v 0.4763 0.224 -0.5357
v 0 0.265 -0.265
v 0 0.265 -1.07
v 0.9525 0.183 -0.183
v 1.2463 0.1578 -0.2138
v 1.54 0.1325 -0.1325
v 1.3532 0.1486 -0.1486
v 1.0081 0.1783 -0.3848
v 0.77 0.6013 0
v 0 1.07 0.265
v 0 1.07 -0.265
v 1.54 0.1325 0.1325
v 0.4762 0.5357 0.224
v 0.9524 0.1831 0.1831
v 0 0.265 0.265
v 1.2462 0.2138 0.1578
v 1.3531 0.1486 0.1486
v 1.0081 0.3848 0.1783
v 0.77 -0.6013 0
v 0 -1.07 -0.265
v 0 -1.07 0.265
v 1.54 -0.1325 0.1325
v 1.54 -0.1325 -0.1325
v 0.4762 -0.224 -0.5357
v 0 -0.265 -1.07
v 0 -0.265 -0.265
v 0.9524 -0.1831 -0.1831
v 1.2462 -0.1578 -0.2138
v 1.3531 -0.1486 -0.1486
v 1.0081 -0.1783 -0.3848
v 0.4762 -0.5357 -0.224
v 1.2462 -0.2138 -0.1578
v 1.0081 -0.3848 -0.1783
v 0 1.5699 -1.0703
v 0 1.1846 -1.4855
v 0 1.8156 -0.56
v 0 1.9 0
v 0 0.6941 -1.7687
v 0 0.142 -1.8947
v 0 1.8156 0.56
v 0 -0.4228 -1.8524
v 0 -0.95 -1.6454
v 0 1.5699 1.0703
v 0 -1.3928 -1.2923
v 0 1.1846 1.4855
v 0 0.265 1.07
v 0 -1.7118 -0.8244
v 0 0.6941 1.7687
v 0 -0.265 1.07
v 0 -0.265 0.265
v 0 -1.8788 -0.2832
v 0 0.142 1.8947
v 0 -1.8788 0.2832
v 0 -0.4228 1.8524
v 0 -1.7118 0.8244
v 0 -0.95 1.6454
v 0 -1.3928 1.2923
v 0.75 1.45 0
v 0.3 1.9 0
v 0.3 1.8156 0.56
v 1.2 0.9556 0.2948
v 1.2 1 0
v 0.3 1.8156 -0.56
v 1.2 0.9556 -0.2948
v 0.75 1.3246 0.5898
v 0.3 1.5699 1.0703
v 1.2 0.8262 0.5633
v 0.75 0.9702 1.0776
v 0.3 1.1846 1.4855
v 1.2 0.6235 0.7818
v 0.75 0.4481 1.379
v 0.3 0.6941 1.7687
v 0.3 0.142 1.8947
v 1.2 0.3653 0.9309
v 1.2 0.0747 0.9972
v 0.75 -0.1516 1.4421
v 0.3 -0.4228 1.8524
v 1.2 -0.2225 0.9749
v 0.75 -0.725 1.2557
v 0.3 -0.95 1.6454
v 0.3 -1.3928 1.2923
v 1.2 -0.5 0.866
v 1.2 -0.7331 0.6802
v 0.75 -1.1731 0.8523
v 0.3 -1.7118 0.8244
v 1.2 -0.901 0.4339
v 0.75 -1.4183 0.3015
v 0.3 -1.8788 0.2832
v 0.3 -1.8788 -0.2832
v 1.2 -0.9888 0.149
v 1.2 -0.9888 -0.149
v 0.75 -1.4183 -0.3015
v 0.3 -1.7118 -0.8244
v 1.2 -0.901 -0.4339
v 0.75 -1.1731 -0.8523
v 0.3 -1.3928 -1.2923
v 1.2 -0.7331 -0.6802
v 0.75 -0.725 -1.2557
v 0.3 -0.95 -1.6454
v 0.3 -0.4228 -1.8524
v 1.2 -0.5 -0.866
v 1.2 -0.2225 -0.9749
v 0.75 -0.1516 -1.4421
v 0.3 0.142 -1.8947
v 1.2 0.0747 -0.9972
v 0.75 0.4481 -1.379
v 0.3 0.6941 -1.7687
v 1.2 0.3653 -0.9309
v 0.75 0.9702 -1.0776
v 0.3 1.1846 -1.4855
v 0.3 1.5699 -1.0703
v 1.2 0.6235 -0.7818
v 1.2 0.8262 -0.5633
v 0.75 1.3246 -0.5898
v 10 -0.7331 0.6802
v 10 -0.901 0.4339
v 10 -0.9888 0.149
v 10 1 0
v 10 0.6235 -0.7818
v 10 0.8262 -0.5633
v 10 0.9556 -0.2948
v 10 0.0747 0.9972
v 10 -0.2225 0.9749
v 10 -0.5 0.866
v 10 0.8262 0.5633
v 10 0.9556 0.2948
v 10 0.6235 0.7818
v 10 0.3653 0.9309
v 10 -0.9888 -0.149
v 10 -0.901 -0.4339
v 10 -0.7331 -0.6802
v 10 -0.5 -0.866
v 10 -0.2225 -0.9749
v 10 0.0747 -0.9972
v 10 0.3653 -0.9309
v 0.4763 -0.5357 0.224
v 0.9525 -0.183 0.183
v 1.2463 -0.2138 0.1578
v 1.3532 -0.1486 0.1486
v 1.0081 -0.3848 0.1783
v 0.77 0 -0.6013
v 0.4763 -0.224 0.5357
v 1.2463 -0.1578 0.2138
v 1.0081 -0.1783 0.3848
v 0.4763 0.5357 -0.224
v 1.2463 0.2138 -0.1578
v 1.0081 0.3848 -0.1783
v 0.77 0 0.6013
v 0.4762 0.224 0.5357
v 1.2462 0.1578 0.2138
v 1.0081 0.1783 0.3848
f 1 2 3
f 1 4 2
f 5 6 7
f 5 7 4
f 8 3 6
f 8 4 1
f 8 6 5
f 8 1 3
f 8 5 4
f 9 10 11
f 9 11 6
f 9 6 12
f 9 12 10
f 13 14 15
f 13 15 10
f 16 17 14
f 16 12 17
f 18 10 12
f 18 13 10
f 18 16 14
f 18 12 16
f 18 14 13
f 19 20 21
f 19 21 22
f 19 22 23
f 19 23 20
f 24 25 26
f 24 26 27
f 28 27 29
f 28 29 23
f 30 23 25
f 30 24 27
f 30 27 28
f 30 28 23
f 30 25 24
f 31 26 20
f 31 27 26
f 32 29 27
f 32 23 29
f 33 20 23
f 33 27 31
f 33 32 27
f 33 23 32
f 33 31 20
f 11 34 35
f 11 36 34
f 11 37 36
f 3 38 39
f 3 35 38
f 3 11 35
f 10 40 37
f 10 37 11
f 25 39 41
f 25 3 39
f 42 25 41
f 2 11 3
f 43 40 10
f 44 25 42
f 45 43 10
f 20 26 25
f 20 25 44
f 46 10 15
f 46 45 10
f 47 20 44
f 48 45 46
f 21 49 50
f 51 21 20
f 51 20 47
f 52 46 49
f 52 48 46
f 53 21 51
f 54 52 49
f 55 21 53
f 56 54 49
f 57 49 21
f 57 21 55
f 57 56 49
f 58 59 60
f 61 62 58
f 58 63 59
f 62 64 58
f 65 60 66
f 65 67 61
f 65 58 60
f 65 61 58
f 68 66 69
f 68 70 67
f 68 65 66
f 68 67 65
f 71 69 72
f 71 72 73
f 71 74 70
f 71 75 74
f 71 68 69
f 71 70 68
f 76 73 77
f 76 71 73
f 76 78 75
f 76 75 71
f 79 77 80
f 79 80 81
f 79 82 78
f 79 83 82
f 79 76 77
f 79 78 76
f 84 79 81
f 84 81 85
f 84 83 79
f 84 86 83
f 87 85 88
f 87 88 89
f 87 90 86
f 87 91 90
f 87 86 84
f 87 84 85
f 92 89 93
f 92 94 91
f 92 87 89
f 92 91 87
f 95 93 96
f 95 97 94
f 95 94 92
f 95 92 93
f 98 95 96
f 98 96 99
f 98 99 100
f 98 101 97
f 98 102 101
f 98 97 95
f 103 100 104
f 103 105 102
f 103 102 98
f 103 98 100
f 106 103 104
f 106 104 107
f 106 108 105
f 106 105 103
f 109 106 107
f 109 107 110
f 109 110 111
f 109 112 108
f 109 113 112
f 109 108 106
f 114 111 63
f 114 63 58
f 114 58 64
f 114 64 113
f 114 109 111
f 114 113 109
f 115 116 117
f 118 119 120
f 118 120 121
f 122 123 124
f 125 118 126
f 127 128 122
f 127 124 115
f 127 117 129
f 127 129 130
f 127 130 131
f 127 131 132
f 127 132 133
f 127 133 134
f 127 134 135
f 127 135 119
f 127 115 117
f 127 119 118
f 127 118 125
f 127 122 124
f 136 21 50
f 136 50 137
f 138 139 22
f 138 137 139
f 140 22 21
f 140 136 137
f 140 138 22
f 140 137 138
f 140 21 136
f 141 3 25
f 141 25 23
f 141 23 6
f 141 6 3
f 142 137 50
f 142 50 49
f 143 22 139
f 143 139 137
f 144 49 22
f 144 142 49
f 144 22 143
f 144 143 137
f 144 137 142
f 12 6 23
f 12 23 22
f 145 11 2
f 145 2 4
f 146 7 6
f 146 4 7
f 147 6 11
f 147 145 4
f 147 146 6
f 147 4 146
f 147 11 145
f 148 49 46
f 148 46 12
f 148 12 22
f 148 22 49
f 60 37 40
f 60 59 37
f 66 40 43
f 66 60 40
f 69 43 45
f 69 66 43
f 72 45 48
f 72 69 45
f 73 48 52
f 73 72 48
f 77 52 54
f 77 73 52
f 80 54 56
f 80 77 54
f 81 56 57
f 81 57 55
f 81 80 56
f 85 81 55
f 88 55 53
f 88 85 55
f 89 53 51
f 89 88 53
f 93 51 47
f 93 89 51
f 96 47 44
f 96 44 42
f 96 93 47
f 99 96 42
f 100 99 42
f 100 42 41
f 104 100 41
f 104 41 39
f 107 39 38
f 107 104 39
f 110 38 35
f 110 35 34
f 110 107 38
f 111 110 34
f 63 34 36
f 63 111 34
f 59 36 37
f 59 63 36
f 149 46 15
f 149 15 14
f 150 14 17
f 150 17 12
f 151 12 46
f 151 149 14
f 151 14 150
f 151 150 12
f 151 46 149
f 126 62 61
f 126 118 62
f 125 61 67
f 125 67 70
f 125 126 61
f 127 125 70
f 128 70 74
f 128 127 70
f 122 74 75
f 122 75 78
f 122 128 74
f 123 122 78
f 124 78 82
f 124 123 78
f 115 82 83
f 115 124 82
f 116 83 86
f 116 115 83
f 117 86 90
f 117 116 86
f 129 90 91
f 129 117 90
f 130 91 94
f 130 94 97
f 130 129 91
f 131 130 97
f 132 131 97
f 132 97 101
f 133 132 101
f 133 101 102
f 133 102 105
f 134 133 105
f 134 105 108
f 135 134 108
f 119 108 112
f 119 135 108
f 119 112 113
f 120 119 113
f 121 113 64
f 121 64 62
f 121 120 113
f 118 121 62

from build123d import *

# Parameters (mm, degrees)
SKETCH3_W         = 0.53
SKETCH3_H         = 2.14
SKETCH4_W         = 0.265
SKETCH4_H         = 0.265
CIRPATTERN1_COUNT = 2
CIRPATTERN1_ANGLE = 90


with BuildPart() as part:
    # BodySke → Base-Revolve (revolve)
    with BuildSketch(Plane.XY):
        Polygon((0, 0), (0, 1.9), (0.3, 1.9), (1.2, 1), (10, 1), (10, 0), align=None)
    revolve(axis=Axis((-6.35, 0, 0), (1, 0, 0)))

    # Sketch3 → Cross section 0
    with BuildSketch(Plane.ZY):
        Rectangle(SKETCH3_W, SKETCH3_H)
    # Sketch4 → Cross section 1
    with BuildSketch(Plane.ZY.offset(-1.54)):
        Rectangle(SKETCH4_W, SKETCH4_H)
    cross = loft(mode=Mode.SUBTRACT)

    # CirPattern1: Cross ×2 about axis
    cirpattern1_axis = Axis((0, 0, 0), (1, 0, 0))
    for i in range(1, CIRPATTERN1_COUNT):
        add(cross.rotate(cirpattern1_axis, i * CIRPATTERN1_ANGLE / (CIRPATTERN1_COUNT - 1)), mode=Mode.SUBTRACT)


solid = part.part
